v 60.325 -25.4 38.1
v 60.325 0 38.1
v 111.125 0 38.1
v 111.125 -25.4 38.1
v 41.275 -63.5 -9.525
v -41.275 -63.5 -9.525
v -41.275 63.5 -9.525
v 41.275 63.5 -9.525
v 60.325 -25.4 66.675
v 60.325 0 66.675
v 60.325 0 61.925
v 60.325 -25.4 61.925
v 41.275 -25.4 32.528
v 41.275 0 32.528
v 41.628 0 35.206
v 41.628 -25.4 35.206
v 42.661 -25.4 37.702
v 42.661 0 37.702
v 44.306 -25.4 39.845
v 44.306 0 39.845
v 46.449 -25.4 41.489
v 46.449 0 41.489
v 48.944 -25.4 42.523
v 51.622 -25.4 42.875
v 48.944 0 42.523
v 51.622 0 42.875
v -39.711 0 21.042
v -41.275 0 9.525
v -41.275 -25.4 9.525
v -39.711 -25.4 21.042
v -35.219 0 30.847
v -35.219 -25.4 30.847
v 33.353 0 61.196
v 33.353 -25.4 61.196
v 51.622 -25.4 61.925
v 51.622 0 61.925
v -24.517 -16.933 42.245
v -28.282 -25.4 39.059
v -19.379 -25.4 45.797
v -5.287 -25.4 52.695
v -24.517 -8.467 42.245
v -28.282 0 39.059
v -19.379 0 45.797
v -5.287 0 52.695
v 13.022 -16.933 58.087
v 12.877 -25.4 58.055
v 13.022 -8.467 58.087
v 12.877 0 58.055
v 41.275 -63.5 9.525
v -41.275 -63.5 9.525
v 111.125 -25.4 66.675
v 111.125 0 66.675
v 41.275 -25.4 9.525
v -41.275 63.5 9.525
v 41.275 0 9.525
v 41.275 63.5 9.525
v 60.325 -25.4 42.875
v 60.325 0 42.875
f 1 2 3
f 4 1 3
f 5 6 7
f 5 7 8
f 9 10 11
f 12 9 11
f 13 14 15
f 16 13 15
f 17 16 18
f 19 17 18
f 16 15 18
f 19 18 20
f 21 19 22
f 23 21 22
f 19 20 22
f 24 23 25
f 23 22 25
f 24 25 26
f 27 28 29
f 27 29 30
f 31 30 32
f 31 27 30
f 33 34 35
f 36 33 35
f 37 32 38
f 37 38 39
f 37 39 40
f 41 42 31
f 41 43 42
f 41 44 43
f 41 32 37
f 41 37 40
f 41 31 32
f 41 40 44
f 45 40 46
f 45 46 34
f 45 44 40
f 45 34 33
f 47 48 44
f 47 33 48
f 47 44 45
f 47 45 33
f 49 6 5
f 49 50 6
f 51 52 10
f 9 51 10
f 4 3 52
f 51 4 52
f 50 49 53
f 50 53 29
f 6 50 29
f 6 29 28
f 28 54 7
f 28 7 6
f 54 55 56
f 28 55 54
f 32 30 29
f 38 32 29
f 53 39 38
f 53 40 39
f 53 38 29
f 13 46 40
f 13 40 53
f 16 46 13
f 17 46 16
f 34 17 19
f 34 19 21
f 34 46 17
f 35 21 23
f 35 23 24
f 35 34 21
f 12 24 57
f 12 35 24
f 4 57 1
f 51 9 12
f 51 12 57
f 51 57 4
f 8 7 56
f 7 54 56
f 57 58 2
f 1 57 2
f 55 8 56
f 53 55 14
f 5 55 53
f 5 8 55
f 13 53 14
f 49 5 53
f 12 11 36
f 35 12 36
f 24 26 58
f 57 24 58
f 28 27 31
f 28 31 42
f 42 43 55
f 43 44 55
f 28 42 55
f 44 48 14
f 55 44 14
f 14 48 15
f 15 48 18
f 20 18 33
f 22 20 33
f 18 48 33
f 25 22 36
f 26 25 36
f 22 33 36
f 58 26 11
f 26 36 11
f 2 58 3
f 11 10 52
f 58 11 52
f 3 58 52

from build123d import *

# Parameters (mm, degrees)
F1_DEPTH = 63.5
F2_DEPTH = 25.4


with BuildPart() as f1:
    # F0 (on Front) → F1 (new body, symmetric)
    with BuildSketch(Plane.XZ):
        Polygon((-41.275, -9.525), (41.275, -9.525), (41.275, -7.805796), (41.275, 9.525), (22.225, 9.525), (-41.275, 9.525), align=None)
    extrude(amount=F1_DEPTH, both=True)

    # F0 (on Front) → F2 (join)
    with BuildSketch(Plane.XZ):
        Polygon((-41.275, -9.525), (41.275, -9.525), (41.275, -7.805796), (41.275, 9.525), (22.225, 9.525), (-41.275, 9.525), align=None)
        with BuildLine():
            add(Edge.make_bspline(
                [(-41.275, 9.525), (-41.482281, 52.308347), (19.065714, 62.464789), (51.622058, 61.9252)],
                knots=[0, 0, 0, 0, 106.656666, 106.656666, 106.656666, 106.656666], degree=3))
            Line((-41.275, 9.525), (22.225, 9.525))
            Line((22.225, 9.525), (22.225, 32.528142))
            ThreePointArc((22.225, 32.528142), (30.835199, 53.315001), (51.622058, 61.9252))
        make_face()
        with BuildLine():
            Line((22.225, 9.525), (41.275, 9.525))
            Line((41.275, 9.525), (41.275, 32.528142))
            ThreePointArc((41.275, 32.528142), (44.305583, 39.844617), (51.622058, 42.8752))
            Line((51.622058, 42.8752), (60.325, 42.8752))
            Line((60.325, 42.8752), (60.325, 61.9252))
            Line((60.325, 61.9252), (51.622058, 61.9252))
            ThreePointArc((51.622058, 61.9252), (30.835199, 53.315001), (22.225, 32.528142))
            Line((22.225, 32.528142), (22.225, 9.525))
        make_face()
        Polygon((60.325, 66.675), (60.325, 61.9252), (60.325, 42.8752), (60.325, 38.1), (82.32934, 38.1), (82.312385, 66.675), align=None)
        Polygon((111.125, 66.675), (82.312385, 66.675), (82.32934, 38.1), (111.125, 38.1), align=None)
    extrude(amount=F2_DEPTH)


solid = f1.part
